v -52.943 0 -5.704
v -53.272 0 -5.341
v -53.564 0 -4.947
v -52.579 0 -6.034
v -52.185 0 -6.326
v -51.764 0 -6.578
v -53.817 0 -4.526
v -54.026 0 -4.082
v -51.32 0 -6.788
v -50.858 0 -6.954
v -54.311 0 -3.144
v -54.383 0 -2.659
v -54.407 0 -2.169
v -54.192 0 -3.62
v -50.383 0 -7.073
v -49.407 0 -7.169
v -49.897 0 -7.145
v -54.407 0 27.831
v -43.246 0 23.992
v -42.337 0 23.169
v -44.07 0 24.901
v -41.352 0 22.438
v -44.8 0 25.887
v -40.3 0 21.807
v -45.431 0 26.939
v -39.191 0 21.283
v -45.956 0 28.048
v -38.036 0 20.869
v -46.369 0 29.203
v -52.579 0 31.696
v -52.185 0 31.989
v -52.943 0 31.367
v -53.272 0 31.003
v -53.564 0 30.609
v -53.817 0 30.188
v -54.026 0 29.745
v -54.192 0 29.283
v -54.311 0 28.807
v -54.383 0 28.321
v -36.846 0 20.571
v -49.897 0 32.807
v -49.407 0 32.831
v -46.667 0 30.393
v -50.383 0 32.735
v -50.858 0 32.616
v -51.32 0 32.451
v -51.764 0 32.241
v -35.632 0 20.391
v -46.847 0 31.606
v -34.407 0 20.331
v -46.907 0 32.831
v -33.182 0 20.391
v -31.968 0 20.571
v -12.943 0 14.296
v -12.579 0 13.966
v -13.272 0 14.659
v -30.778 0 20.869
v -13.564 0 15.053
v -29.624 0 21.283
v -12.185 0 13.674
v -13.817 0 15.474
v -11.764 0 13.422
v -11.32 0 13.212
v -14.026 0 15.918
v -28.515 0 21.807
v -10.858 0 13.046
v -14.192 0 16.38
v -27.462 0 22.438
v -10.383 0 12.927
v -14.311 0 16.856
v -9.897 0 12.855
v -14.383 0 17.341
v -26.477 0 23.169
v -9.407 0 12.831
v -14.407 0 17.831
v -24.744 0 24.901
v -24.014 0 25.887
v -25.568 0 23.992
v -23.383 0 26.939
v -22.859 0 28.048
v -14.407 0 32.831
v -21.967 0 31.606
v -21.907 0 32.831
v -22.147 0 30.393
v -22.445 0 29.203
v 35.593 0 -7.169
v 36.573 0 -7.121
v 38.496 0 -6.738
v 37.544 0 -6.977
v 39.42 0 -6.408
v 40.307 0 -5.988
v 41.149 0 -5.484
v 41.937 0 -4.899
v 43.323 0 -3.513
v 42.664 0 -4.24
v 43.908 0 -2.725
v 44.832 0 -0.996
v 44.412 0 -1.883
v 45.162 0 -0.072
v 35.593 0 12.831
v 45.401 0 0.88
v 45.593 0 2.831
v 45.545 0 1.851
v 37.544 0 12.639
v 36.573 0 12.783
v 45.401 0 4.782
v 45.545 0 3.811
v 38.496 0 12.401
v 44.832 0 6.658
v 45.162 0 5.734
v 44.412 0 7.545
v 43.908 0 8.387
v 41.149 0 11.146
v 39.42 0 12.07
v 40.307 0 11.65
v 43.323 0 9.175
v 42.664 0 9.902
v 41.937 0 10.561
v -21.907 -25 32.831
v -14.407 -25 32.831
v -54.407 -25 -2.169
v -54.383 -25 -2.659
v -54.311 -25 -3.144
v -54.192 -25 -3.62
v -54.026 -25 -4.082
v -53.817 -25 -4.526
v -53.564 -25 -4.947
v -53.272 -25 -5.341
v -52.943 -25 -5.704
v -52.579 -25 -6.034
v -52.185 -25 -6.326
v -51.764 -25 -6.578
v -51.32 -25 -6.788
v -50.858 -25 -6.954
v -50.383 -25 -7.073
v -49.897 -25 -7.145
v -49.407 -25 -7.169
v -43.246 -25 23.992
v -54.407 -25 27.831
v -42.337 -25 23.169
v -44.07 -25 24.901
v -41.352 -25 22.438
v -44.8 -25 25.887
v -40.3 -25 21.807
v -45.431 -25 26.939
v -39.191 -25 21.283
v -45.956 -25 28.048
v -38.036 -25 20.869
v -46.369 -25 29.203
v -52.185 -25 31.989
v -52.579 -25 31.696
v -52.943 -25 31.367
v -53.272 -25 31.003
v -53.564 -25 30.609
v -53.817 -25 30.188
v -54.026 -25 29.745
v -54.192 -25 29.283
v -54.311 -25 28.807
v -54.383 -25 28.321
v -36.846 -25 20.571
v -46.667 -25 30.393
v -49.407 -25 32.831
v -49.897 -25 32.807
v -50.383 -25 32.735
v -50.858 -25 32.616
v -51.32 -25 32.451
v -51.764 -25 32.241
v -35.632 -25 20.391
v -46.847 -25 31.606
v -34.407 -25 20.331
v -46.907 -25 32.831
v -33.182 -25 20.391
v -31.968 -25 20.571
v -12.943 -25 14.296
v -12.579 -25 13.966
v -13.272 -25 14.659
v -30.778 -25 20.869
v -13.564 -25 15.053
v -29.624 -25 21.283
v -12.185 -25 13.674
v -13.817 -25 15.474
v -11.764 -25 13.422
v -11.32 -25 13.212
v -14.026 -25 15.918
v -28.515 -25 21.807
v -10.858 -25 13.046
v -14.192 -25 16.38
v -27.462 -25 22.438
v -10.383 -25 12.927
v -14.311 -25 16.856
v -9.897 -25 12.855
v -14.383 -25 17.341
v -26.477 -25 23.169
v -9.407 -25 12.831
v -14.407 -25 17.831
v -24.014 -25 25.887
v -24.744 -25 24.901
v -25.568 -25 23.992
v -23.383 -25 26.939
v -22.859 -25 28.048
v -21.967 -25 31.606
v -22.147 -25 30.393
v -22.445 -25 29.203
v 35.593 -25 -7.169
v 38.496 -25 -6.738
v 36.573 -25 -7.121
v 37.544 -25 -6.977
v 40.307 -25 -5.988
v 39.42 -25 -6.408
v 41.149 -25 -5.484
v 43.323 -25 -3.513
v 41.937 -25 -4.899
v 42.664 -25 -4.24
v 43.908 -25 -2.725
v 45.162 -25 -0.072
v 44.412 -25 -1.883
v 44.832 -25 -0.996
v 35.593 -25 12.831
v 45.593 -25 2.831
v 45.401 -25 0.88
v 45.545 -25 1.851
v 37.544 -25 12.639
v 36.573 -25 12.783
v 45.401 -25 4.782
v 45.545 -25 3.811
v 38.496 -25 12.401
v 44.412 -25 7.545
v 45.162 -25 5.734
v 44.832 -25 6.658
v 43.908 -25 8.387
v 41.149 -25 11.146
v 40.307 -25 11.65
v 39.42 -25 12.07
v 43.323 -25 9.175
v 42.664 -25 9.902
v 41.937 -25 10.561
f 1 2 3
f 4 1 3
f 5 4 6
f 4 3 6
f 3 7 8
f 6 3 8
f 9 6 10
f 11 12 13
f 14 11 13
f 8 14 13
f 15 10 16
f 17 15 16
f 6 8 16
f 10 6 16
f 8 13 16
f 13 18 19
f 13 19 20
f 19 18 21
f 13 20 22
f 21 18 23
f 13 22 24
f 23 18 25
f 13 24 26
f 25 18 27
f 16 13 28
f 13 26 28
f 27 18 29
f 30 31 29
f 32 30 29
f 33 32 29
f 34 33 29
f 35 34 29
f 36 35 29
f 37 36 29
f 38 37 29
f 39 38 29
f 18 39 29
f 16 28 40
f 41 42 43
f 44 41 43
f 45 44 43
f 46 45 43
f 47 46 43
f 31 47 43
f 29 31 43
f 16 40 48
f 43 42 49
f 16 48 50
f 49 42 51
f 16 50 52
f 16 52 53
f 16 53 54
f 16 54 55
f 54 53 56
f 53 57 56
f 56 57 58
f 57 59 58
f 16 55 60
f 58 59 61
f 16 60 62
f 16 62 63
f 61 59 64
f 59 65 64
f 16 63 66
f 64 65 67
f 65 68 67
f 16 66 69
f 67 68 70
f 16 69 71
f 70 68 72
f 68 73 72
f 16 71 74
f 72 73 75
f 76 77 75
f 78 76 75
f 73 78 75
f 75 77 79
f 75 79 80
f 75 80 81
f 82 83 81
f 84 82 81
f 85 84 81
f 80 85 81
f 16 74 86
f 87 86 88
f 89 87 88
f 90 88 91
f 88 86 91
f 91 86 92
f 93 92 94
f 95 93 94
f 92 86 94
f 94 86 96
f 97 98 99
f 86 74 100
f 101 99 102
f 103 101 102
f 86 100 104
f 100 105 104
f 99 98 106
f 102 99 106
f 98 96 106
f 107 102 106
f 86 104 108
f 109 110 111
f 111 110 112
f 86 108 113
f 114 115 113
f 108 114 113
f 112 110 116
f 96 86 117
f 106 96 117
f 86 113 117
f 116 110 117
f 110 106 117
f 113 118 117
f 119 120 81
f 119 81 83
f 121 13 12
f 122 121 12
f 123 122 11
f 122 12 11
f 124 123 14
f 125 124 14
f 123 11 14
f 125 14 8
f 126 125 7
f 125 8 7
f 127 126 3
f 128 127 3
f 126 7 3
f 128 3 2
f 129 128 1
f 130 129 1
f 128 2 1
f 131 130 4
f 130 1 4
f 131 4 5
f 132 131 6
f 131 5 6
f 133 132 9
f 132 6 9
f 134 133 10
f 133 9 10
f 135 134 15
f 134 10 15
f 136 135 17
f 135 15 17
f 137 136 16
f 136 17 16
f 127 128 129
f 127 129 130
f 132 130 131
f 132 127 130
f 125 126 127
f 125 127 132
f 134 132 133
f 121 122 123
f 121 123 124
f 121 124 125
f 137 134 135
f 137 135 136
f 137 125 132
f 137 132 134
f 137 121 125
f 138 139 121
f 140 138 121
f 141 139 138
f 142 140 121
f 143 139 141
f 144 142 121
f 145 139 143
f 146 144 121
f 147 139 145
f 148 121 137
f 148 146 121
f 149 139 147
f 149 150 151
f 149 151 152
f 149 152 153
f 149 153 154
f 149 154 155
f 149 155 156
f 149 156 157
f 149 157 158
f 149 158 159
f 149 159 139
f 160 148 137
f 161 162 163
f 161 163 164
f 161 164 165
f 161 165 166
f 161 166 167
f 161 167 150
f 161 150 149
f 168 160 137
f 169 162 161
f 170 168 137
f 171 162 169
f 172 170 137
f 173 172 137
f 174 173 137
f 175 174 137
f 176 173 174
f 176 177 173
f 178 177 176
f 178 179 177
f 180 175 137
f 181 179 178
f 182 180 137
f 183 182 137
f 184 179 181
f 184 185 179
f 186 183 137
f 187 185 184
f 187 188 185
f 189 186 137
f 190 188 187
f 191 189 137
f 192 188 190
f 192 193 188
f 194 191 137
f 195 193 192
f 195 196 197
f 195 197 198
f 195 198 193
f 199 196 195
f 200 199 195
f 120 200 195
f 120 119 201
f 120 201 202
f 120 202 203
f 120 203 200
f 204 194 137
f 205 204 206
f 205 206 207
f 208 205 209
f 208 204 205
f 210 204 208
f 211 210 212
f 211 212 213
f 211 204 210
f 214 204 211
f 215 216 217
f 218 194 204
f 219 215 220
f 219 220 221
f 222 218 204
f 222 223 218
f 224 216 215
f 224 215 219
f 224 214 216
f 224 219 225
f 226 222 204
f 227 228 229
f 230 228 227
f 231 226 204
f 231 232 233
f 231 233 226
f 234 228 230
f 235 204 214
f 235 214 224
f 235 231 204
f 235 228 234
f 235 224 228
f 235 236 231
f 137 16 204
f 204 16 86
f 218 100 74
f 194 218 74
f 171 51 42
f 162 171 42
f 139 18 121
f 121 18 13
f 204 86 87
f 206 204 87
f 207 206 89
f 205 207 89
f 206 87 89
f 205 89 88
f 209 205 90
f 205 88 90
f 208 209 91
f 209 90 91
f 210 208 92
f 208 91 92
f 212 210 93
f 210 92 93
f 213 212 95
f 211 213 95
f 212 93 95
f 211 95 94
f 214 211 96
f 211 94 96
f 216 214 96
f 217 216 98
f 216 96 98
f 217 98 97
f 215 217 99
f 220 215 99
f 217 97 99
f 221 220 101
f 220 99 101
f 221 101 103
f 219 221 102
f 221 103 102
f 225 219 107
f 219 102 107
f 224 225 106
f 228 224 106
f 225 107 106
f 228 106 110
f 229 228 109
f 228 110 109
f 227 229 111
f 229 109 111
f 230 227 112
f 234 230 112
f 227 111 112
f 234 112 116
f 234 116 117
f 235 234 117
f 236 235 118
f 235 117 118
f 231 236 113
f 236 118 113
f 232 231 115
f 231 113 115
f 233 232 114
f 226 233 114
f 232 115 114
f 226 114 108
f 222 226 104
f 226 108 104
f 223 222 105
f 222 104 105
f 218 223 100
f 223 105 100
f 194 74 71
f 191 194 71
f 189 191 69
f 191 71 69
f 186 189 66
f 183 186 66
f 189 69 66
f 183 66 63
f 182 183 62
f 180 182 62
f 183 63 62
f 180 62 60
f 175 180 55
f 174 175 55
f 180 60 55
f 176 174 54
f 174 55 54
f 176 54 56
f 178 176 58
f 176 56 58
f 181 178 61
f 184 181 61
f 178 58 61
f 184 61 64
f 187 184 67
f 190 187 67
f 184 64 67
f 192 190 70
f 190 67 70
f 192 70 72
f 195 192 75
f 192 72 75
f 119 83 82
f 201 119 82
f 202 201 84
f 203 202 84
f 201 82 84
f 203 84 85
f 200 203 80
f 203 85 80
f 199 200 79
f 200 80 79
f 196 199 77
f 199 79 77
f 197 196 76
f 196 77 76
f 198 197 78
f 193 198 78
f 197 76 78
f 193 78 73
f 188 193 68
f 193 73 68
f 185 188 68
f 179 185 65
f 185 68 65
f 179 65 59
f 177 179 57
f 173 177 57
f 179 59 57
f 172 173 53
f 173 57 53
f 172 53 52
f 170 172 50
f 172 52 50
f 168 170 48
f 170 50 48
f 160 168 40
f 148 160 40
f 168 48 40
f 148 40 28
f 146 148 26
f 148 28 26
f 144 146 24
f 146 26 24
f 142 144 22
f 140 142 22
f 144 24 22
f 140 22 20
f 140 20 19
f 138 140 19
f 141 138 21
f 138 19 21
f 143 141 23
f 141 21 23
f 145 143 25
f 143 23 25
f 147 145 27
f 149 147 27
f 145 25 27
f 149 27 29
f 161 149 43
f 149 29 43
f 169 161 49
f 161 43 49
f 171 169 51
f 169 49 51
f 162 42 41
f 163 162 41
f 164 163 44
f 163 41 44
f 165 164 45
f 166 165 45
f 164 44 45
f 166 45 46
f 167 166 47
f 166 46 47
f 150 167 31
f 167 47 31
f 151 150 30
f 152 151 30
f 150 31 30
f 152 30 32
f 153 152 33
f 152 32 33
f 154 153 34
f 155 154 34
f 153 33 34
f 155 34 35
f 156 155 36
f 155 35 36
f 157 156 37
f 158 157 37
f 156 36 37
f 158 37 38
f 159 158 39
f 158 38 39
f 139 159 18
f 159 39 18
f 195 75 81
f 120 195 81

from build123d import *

# Parameters (mm, degrees)
F1_DEPTH = 25


with BuildPart() as f1:
    # F0 (on Front) → F1 (new body)
    with BuildSketch(Plane.XZ):
        with BuildLine():
            Line((-46.907052, 32.831196), (-49.407052, 32.831196))
            ThreePointArc((-49.407052, 32.831196), (-52.942586, 31.36673), (-54.407052, 27.831196))
            Line((-54.407052, 27.831196), (-54.407052, -2.168804))
            ThreePointArc((-54.407052, -2.168804), (-52.942586, -5.704338), (-49.407052, -7.168804))
            Line((-49.407052, -7.168804), (35.592948, -7.168804))
            ThreePointArc((35.592948, -7.168804), (45.592948, 2.831196), (35.592948, 12.831196))
            Line((35.592948, 12.831196), (-9.407052, 12.831196))
            ThreePointArc((-9.407052, 12.831196), (-12.942586, 14.295662), (-14.407052, 17.831196))
            Line((-14.407052, 17.831196), (-14.407052, 32.831196))
            Line((-14.407052, 32.831196), (-21.907052, 32.831196))
            ThreePointArc((-21.907052, 32.831196), (-34.407052, 20.331196), (-46.907052, 32.831196))
        make_face()
    extrude(amount=F1_DEPTH)


solid = f1.part
